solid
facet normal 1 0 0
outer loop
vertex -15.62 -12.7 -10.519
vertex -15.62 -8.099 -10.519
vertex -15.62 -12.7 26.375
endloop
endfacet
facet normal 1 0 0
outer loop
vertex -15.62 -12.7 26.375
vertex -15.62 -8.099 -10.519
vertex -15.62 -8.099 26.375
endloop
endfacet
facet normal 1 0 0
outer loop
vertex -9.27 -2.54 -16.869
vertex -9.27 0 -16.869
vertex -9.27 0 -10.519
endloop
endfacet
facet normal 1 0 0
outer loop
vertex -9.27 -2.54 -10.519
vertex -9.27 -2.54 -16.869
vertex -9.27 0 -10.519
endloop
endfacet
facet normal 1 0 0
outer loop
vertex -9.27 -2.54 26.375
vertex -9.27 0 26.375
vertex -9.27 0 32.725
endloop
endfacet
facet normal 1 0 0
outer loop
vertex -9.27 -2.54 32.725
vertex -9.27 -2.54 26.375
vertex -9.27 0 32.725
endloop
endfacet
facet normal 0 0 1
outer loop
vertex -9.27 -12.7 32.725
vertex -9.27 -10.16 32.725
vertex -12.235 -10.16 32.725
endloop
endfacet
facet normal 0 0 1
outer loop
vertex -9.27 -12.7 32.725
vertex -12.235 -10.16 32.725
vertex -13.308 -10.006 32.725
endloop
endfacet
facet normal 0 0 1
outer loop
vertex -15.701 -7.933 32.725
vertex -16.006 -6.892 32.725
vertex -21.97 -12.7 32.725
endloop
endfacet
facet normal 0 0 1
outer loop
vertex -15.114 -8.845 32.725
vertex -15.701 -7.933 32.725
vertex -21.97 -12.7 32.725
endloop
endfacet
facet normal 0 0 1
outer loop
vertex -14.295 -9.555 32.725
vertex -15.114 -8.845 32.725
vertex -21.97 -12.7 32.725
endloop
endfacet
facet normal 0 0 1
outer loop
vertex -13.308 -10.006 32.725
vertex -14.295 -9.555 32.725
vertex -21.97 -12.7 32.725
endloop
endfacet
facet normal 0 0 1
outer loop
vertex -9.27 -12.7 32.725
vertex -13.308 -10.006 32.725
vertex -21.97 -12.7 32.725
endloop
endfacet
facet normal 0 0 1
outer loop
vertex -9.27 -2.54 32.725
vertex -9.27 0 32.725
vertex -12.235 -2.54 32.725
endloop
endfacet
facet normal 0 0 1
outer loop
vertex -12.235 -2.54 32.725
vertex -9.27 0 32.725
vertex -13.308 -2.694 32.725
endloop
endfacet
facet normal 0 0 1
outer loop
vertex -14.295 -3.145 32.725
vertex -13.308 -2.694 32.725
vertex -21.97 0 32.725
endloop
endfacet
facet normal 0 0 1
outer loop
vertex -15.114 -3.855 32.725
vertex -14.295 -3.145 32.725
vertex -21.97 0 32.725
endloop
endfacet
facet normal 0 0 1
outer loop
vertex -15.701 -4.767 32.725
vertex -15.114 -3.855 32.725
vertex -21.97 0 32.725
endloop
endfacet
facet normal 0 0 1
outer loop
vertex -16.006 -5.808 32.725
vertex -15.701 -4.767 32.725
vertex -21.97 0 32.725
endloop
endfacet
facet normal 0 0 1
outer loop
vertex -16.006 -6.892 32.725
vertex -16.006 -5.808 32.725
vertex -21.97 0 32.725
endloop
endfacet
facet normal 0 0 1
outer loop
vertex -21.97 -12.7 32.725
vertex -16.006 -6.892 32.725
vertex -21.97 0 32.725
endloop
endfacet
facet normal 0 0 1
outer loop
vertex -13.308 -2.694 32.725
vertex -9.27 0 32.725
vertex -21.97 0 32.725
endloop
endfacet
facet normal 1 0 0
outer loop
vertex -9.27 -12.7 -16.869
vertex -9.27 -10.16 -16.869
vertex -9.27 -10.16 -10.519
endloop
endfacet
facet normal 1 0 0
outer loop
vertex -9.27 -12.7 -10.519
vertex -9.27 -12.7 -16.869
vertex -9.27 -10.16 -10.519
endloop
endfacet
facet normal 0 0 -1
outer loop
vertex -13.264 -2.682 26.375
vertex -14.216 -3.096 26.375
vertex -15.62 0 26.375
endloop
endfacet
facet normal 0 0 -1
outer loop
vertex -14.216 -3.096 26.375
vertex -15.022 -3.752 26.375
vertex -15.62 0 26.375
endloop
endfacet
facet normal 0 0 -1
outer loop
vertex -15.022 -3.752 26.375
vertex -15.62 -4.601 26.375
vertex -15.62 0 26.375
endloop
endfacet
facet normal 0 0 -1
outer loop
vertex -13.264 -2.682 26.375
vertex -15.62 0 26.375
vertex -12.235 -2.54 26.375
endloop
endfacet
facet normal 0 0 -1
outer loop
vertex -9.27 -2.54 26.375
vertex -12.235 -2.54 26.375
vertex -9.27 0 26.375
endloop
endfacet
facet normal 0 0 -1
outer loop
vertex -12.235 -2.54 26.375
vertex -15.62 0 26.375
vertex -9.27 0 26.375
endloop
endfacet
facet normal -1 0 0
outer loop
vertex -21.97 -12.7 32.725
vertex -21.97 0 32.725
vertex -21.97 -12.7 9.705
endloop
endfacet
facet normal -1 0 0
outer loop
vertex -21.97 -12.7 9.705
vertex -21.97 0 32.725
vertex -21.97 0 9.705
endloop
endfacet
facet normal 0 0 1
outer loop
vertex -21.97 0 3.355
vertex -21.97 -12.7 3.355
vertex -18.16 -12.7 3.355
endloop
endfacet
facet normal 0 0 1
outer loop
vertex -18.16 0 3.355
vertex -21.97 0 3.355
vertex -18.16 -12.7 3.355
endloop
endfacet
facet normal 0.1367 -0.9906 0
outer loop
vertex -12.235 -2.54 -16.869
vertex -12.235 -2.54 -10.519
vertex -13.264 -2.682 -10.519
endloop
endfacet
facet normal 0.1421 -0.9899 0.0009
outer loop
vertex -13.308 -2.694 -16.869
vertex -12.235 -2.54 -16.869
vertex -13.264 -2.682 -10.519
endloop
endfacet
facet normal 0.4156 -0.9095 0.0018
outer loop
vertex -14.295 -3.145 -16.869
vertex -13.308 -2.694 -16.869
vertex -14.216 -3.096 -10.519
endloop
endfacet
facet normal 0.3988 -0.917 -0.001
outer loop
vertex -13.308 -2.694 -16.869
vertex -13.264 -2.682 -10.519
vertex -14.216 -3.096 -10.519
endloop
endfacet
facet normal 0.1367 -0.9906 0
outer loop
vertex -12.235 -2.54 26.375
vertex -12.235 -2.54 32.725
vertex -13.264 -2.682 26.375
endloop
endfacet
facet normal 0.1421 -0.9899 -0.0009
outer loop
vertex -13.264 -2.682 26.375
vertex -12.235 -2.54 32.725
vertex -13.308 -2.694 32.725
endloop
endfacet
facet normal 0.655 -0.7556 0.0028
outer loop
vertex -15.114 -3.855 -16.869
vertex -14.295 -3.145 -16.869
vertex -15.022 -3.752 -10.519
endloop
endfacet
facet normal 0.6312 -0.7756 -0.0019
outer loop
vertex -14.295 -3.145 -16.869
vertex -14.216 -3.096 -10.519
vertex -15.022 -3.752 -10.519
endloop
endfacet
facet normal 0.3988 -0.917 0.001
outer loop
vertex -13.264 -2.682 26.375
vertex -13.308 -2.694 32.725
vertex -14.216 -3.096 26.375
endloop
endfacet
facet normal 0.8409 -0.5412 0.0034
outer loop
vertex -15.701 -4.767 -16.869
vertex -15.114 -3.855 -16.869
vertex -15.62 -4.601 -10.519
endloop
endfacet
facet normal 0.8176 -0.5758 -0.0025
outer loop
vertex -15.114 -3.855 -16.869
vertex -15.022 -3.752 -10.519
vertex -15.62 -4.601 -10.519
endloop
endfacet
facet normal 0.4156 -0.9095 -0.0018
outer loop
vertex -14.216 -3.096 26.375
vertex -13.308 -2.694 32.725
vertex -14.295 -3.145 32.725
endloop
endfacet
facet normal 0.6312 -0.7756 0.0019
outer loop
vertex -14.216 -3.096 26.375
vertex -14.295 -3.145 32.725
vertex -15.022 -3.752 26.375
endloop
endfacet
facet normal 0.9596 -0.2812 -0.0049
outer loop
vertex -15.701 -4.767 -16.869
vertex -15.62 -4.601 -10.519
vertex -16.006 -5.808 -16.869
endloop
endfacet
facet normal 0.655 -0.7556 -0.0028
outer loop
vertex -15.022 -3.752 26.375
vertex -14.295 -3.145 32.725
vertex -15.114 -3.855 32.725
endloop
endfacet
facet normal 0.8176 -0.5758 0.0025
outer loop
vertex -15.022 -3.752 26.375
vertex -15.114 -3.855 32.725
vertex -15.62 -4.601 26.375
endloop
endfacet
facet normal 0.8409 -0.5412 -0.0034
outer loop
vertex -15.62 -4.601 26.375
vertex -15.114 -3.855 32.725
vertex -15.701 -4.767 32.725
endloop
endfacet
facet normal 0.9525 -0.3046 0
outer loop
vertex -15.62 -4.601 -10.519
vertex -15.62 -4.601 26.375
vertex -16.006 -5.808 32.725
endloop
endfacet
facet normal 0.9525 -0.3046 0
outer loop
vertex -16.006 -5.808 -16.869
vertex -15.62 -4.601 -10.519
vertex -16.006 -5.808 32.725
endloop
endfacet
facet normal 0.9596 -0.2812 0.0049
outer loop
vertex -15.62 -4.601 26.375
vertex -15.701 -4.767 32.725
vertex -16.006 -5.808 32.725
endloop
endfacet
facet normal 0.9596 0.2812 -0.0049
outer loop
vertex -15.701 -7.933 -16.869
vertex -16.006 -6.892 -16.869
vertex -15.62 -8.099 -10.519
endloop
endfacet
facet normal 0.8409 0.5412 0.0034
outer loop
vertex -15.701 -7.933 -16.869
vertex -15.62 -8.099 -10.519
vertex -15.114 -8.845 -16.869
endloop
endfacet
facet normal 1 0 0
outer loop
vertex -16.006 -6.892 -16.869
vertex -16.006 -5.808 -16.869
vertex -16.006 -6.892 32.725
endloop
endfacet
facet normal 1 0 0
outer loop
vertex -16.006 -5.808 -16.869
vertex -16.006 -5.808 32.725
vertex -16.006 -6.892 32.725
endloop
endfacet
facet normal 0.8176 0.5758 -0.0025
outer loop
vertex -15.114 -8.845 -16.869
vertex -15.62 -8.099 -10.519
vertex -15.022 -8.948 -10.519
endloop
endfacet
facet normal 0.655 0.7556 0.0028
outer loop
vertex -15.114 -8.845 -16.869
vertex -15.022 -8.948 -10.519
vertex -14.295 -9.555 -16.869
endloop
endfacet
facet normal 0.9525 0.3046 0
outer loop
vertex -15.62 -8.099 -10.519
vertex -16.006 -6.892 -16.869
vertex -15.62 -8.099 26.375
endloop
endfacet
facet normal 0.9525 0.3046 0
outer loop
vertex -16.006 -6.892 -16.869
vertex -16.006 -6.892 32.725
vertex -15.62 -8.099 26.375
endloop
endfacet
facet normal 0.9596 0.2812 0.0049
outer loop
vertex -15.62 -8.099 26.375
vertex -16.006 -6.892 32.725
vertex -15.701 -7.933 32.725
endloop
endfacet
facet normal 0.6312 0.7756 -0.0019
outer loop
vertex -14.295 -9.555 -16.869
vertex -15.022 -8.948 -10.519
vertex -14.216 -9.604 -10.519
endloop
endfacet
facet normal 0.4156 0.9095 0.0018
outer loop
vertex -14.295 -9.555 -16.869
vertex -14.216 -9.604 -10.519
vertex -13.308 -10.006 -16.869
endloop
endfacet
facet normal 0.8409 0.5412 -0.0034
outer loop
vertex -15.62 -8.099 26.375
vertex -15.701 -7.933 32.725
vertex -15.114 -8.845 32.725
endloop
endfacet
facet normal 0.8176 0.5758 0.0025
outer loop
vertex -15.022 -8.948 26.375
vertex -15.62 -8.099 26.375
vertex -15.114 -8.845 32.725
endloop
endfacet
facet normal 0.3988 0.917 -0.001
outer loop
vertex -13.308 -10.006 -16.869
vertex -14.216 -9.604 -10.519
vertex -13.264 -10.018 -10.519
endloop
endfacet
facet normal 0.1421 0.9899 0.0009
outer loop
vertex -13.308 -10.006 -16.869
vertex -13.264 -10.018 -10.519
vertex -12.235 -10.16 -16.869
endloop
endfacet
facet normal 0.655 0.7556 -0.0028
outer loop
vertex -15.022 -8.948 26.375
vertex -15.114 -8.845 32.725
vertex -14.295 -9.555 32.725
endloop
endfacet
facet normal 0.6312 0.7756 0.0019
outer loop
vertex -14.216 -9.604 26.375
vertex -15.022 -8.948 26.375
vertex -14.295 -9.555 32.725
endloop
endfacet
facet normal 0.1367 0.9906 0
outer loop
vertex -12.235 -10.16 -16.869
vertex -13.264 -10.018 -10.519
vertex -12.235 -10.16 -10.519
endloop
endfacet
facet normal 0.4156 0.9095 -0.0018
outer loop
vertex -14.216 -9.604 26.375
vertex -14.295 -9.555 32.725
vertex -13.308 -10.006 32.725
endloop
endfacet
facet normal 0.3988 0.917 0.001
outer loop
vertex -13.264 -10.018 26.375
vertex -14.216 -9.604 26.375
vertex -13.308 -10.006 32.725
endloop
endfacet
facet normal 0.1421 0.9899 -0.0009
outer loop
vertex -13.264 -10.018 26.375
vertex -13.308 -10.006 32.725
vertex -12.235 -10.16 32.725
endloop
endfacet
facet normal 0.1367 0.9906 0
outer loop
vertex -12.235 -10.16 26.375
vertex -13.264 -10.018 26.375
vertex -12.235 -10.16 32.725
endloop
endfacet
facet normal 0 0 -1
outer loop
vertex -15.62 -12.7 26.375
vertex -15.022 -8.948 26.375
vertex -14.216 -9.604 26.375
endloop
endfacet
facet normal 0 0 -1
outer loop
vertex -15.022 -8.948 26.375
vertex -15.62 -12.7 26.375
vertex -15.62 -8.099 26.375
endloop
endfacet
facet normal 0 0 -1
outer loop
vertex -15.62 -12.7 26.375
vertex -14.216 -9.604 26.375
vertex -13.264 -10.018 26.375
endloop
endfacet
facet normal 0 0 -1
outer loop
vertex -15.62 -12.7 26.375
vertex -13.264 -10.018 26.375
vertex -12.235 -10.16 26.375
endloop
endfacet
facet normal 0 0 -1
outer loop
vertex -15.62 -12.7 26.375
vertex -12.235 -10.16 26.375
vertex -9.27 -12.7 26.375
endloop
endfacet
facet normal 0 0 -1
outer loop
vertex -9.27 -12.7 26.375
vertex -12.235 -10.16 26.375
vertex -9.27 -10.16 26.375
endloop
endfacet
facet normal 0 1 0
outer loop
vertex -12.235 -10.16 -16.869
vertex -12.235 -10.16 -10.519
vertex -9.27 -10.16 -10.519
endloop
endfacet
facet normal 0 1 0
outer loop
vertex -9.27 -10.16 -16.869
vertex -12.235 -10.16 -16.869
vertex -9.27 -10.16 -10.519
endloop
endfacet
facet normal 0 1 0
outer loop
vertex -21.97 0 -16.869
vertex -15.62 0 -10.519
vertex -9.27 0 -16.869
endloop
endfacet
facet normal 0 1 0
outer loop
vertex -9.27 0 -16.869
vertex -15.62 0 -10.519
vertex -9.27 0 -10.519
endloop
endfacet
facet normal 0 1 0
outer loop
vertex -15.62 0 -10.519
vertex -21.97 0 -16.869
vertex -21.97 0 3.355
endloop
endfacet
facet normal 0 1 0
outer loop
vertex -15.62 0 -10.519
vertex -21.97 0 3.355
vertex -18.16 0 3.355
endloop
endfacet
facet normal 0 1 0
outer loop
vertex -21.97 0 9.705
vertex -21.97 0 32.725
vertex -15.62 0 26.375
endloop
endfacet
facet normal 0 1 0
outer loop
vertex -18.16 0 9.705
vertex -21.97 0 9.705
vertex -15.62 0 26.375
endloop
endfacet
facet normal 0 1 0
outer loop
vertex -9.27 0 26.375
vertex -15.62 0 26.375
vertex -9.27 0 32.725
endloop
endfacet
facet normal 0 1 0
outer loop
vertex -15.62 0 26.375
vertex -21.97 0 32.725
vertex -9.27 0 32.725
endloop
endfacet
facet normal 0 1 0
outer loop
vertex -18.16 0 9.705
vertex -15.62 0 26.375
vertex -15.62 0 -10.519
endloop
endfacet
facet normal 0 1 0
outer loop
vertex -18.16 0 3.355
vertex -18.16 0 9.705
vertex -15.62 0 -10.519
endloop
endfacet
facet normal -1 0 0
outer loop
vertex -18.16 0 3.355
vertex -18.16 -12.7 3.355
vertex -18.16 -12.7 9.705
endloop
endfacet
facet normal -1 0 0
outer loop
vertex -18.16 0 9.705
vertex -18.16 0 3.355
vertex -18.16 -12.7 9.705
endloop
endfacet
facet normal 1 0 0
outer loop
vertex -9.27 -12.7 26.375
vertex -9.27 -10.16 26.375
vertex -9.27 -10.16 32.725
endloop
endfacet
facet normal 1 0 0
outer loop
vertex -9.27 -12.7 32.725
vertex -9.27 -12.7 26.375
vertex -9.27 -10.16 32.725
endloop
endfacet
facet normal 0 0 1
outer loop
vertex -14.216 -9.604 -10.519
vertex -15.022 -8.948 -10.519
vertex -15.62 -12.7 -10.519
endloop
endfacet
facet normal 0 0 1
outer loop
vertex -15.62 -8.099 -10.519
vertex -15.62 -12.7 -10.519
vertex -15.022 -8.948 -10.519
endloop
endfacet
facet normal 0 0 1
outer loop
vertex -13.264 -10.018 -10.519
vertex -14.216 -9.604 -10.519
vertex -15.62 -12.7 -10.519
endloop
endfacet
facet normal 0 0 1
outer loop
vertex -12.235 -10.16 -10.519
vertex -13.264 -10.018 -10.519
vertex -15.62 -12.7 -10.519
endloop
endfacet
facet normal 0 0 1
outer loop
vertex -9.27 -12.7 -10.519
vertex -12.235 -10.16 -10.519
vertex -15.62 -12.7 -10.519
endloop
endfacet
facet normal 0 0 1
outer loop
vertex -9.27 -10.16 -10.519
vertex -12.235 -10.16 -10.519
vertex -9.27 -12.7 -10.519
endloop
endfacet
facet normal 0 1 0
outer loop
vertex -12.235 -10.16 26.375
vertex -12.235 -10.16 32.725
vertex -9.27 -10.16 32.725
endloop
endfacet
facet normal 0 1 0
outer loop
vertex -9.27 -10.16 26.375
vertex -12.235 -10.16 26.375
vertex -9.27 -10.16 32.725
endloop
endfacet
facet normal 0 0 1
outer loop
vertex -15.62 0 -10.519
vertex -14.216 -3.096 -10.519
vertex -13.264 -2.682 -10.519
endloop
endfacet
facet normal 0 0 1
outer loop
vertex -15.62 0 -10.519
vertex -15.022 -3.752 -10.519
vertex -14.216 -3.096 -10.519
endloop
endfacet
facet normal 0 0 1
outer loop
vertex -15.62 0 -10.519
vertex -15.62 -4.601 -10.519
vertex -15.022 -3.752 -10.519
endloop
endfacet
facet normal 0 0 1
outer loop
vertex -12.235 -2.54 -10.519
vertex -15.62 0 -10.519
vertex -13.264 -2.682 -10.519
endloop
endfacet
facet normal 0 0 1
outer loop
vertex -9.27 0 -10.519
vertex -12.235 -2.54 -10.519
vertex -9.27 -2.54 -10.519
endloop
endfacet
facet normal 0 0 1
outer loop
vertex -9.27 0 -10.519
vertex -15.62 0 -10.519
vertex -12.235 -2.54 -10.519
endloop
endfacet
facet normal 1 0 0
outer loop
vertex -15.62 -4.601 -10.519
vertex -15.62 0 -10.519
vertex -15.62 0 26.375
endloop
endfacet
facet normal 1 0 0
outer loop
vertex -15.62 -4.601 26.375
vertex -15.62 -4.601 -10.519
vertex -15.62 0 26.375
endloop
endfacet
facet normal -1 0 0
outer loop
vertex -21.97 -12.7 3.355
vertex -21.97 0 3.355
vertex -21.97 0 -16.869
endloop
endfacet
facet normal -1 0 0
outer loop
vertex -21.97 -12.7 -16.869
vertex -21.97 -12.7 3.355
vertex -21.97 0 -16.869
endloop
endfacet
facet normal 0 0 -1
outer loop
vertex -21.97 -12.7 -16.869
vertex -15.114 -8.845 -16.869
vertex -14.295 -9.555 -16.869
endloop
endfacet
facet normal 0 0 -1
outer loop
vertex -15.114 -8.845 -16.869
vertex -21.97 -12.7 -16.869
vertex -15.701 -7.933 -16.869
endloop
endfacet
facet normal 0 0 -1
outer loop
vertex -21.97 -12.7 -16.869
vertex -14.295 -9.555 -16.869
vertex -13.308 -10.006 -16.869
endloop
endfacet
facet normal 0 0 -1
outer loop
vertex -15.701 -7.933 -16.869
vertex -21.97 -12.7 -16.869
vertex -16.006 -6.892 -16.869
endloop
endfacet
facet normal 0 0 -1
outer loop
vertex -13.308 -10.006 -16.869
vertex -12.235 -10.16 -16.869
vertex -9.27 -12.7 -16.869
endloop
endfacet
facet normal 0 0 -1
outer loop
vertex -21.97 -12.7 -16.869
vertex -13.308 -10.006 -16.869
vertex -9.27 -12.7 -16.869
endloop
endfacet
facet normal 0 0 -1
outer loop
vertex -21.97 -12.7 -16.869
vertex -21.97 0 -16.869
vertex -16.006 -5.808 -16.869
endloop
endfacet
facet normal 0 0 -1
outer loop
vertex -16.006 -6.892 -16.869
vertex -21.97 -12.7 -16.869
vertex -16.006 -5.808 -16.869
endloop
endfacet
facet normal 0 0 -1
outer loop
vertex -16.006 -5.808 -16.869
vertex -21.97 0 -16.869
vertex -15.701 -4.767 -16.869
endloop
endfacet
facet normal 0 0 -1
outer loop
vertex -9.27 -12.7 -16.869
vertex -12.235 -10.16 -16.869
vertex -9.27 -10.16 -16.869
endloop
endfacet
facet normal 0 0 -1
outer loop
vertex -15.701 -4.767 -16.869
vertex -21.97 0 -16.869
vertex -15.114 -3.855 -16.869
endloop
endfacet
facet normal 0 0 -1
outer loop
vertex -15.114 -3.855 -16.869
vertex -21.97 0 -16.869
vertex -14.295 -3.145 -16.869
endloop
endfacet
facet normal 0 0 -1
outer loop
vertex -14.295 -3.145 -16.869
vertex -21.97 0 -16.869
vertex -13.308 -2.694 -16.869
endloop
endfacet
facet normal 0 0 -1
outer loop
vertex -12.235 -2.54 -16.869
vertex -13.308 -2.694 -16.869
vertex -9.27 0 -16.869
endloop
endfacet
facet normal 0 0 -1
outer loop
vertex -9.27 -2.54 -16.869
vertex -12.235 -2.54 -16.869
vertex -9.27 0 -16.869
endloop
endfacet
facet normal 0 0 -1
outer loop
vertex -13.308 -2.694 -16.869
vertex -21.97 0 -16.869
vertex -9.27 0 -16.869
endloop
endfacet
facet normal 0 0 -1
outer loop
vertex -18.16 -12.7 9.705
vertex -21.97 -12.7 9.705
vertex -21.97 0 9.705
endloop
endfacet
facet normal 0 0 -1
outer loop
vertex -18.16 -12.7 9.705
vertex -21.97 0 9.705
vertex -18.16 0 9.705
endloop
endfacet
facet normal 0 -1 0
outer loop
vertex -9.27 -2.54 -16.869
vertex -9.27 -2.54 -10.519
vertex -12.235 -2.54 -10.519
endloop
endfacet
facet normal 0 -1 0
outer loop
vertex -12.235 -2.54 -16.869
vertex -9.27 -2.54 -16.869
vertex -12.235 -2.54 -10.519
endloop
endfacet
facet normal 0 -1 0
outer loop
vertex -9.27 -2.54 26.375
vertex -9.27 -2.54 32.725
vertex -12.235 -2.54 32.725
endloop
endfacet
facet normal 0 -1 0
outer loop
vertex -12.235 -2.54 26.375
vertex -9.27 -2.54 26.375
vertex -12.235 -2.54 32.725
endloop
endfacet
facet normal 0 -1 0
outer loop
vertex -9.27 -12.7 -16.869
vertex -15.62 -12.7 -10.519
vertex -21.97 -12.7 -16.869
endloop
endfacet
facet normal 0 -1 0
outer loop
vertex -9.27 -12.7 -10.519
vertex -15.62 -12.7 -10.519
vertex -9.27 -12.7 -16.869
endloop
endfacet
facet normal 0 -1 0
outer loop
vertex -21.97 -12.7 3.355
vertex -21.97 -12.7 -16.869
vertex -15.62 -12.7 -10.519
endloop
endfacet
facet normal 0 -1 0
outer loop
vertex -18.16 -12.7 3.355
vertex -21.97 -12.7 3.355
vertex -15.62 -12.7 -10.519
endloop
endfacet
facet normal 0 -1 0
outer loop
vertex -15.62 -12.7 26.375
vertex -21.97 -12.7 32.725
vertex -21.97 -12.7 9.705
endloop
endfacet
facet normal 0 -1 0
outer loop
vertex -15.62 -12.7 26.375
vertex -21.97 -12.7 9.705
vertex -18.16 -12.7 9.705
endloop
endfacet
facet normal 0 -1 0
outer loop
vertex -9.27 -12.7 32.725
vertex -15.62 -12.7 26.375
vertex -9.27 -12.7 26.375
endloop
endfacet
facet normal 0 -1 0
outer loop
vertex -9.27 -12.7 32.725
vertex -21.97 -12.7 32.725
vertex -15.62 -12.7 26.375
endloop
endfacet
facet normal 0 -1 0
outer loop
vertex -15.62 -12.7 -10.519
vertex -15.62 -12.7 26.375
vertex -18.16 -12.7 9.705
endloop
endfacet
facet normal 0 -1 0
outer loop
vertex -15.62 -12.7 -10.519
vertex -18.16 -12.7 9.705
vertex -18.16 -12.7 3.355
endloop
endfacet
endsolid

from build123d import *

# Parameters (mm, degrees)
F0_W     = 6.35
F0_H     = 6.35
F1_DEPTH = 12.7
F3_DEPTH = 49.594854
F4_W     = 3.81
F4_H     = 6.35
F5_DEPTH = 25.4


with BuildPart() as f1:
    # F0 (on Front) → F1 (new body)
    with BuildSketch(Plane.XZ):
        Polygon((-21.969653, 32.725027), (-21.969653, -16.868828), (-15.619653, -16.868828), (-15.619653, -10.518828), (-15.619653, 26.375027), (-15.619653, 32.725027), align=None)
        with Locations((-12.444653, -13.693828)):
            Rectangle(F0_W, F0_H)
        with Locations((-12.444653, 29.550027)):
            Rectangle(F0_W, F0_H)
    extrude(amount=F1_DEPTH)

    # F2 (on face) → F3 (cut, through all)
    with BuildSketch(Plane.XY.offset(32.725027)):
        with BuildLine():
            Line((-12.234837, -10.16), (-9.269653, -10.16))
            Line((-9.269653, -10.16), (-9.269653, -2.54))
            Line((-9.269653, -2.54), (-12.234837, -2.54))
            ThreePointArc((-12.234837, -2.54), (-16.044837, -6.35), (-12.234837, -10.16))
        make_face()
    extrude(amount=-F3_DEPTH, mode=Mode.SUBTRACT)

    # F4 (on face) → F5 (cut)
    with BuildSketch(Plane.XZ.offset(12.7)):
        with Locations((-20.064653, 6.530325)):
            Rectangle(F4_W, F4_H)
    extrude(amount=-F5_DEPTH, mode=Mode.SUBTRACT)


solid = f1.part
